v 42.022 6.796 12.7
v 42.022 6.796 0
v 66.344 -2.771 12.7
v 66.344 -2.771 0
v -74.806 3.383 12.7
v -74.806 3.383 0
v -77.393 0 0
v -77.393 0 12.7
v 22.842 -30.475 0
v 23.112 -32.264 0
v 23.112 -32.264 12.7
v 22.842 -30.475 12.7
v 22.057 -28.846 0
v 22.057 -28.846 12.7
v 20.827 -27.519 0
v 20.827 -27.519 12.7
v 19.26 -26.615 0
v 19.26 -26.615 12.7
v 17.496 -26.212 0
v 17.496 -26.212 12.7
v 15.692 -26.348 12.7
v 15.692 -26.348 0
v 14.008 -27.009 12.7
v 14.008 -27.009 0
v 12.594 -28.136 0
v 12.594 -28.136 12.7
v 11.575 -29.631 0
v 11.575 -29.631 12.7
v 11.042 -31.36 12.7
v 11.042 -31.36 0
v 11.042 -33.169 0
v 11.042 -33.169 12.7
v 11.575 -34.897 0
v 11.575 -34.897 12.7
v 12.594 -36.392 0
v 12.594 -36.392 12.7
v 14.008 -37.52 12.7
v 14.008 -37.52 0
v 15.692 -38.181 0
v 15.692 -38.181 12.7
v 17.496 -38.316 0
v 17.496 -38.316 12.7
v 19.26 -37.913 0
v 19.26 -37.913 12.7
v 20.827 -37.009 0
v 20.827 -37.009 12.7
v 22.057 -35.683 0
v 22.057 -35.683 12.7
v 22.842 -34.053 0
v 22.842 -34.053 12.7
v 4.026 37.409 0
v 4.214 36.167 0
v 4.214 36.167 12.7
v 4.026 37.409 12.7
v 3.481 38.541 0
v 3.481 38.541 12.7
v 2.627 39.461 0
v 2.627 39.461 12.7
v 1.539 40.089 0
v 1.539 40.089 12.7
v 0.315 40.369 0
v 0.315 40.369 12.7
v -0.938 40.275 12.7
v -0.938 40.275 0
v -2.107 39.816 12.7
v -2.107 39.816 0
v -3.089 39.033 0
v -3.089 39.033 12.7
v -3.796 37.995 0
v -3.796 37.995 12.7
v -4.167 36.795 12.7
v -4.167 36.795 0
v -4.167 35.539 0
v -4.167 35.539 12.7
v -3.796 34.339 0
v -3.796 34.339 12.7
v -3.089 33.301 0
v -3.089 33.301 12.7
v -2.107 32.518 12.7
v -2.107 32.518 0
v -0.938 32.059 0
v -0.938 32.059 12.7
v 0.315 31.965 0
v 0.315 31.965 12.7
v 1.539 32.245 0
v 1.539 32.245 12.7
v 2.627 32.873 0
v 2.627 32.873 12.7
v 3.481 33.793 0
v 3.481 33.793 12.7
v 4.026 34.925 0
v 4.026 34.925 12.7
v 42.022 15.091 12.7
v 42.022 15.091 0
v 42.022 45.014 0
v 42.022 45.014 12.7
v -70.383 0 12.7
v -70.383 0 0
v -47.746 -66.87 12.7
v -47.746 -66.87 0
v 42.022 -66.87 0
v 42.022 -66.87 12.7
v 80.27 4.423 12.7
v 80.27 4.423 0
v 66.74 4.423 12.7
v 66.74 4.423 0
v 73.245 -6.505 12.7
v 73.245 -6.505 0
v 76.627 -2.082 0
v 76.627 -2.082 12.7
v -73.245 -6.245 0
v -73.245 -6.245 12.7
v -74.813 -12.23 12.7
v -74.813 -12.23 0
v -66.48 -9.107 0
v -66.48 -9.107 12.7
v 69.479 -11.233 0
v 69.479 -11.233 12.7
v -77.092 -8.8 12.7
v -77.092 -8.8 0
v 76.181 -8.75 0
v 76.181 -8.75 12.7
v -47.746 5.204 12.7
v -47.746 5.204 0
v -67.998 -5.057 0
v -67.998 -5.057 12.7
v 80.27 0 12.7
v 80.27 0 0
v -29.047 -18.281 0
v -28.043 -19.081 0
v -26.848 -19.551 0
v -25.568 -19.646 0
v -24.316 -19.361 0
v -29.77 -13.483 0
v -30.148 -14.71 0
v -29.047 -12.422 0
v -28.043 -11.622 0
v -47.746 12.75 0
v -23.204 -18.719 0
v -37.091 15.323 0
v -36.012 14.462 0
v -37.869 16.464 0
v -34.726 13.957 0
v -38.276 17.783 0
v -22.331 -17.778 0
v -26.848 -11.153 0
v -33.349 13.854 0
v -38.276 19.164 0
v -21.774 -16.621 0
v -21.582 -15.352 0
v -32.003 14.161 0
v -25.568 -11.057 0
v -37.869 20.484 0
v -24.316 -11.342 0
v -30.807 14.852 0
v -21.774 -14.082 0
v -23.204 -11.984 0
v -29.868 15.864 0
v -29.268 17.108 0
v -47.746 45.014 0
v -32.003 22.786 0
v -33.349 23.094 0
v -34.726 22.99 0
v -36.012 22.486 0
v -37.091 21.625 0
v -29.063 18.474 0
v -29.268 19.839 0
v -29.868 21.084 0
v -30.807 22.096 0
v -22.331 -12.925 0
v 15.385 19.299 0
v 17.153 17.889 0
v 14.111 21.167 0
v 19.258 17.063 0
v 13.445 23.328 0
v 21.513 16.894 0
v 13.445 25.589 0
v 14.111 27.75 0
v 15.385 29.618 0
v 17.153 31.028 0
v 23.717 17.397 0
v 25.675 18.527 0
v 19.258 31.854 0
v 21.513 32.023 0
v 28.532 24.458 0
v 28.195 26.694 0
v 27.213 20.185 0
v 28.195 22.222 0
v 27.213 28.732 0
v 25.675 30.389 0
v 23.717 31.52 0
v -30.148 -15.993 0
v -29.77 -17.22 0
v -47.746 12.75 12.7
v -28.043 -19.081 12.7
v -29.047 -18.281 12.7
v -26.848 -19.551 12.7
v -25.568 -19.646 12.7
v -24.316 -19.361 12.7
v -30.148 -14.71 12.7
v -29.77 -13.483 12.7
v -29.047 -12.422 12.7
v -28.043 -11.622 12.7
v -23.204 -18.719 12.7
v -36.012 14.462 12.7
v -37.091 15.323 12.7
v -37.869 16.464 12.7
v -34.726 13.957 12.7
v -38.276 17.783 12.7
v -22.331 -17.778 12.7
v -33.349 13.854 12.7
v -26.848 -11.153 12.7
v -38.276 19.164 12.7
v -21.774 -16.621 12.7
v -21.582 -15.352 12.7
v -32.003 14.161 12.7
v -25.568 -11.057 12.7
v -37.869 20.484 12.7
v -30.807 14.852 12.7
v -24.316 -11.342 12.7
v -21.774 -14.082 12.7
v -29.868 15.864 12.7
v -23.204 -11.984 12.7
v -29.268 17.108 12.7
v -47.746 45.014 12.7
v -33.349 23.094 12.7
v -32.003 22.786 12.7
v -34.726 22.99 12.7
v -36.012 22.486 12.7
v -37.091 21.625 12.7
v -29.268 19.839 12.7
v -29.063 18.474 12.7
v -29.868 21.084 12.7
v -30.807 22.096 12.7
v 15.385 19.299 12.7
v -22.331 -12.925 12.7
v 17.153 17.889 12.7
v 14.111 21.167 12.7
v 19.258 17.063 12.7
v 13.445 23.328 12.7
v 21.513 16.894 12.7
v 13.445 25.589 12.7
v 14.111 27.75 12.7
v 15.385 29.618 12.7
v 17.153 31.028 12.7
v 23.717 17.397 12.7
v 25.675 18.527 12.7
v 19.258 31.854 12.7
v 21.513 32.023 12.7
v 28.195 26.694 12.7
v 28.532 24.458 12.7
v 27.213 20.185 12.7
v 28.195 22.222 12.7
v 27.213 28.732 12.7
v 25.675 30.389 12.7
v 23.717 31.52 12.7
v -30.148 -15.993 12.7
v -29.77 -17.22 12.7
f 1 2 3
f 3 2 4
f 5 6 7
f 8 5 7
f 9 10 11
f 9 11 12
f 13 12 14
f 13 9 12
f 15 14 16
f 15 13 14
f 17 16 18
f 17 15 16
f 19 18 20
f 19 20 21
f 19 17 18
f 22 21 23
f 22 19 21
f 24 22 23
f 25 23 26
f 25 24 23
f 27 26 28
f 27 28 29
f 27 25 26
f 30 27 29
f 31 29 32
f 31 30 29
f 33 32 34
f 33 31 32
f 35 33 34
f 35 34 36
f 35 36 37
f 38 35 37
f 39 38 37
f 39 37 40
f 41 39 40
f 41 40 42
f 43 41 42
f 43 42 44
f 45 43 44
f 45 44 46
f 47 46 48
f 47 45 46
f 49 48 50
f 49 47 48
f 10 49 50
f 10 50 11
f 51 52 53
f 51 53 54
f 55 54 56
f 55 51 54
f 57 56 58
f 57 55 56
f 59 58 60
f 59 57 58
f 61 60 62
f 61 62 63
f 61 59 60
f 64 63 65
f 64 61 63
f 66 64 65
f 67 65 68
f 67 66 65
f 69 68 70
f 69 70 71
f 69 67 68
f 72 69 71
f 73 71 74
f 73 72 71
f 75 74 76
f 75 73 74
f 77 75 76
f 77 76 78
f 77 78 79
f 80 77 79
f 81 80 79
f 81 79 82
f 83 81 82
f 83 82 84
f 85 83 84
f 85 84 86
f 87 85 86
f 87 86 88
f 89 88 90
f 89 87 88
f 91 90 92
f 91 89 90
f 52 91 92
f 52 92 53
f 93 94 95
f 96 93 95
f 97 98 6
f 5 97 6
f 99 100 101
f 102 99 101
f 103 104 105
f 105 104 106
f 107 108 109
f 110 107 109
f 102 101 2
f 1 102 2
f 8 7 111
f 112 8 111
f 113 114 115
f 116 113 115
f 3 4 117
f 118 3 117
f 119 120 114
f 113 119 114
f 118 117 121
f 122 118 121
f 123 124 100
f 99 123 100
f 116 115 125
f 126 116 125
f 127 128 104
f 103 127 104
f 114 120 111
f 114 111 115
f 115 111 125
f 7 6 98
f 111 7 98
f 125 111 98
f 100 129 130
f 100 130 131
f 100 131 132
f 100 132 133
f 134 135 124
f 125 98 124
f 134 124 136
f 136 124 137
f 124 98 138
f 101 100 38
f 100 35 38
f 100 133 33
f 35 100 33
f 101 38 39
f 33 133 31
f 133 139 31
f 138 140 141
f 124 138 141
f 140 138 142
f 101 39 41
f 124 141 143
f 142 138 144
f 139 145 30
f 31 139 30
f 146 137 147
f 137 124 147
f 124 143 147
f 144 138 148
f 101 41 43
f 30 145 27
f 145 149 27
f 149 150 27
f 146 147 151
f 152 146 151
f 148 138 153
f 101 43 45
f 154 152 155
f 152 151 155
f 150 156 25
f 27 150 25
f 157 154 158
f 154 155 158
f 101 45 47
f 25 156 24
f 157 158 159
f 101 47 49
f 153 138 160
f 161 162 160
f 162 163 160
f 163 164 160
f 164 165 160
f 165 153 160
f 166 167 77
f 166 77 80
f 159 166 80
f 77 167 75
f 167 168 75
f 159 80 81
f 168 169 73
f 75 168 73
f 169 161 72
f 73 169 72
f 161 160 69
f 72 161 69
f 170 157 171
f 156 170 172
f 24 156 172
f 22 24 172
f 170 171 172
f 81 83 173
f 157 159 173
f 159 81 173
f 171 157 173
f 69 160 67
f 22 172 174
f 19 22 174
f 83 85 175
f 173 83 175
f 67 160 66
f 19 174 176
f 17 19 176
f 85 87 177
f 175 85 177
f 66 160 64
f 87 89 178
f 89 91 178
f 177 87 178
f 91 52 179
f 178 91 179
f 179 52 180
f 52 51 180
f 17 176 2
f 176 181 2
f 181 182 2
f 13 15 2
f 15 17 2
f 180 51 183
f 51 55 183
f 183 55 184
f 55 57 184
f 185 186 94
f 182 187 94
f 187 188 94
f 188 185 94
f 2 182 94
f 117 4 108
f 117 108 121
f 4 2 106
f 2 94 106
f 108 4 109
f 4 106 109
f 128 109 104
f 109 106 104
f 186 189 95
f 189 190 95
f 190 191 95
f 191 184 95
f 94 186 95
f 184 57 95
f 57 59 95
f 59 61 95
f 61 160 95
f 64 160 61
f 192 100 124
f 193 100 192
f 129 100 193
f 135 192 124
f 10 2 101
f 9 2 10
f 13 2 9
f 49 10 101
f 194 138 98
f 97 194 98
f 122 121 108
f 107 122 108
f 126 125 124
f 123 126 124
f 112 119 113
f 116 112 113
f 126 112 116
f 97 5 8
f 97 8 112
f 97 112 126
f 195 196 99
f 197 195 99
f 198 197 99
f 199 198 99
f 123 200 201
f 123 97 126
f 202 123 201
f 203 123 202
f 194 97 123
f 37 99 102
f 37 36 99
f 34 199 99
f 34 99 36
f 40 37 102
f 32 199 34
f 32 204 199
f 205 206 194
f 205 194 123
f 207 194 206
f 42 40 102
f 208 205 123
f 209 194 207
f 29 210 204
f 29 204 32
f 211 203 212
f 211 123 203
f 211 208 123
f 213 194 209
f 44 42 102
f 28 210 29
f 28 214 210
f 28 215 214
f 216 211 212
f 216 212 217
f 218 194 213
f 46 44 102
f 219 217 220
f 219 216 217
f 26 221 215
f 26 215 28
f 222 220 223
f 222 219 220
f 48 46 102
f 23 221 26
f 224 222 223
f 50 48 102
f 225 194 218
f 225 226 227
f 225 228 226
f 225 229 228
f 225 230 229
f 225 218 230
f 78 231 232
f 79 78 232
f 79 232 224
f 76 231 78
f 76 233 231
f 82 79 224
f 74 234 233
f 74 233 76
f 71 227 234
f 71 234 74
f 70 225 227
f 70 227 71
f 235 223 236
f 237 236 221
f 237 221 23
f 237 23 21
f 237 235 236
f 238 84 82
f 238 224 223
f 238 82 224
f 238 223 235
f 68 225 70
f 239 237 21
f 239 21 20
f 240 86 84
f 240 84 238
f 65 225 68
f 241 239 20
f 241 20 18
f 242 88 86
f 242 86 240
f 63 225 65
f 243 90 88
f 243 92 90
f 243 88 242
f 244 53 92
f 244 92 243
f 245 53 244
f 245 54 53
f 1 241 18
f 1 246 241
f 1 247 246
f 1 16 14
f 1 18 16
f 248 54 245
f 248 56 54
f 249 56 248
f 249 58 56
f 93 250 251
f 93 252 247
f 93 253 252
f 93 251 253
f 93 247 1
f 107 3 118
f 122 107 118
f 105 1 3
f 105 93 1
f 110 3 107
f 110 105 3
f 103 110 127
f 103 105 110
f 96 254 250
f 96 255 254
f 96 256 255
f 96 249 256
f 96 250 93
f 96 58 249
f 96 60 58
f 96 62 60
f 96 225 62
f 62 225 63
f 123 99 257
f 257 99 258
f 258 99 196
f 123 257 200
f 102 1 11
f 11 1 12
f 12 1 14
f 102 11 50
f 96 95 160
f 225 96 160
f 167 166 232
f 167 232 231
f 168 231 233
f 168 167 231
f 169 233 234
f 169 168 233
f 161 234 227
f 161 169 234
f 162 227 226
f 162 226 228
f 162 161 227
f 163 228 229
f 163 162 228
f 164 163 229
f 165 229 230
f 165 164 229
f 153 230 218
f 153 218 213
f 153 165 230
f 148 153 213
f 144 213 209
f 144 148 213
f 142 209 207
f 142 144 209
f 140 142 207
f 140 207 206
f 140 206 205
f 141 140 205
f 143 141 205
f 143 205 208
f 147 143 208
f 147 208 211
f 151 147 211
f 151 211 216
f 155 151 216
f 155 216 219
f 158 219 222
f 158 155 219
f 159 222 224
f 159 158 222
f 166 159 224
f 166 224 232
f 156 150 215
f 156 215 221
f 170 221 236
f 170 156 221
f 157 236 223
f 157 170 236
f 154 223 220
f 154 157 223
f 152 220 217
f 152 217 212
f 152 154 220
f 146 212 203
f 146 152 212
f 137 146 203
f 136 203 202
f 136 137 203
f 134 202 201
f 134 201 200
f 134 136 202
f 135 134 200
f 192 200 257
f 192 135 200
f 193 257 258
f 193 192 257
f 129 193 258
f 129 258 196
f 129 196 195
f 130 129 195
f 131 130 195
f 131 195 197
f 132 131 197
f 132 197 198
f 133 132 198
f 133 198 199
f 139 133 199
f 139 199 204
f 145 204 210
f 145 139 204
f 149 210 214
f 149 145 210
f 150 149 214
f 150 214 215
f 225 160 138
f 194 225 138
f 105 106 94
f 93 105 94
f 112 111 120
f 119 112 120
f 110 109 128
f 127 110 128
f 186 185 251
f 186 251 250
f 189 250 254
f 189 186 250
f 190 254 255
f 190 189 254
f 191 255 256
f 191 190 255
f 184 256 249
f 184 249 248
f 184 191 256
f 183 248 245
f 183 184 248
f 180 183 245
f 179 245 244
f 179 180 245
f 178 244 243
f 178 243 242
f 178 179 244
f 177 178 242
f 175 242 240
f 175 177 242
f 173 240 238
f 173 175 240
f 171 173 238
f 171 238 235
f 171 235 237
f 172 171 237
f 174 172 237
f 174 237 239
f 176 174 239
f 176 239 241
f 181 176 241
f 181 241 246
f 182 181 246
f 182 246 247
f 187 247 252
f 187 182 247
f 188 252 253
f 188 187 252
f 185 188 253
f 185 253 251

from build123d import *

# Parameters (mm, degrees)
F0_R     = 4.306996
F0_R_2   = 6.068742
F0_R_3   = 4.632643
F0_R_4   = 4.213633
F0_R_5   = 7.585926
F1_DEPTH = 12.7


with BuildPart() as f1:
    # F0 (on Top) → F1 (new body)
    with BuildSketch(Plane.XY):
        Polygon((42.021509, 45.013756), (-47.745805, 45.013756), (-47.745805, 12.749561), (-47.745805, 5.203902), (-47.745805, -66.870145), (42.021509, -66.870145), (42.021509, 6.79579), (42.021509, 15.091317), align=None)
        with Locations((-25.889417, -15.351512)):
            Circle(F0_R, mode=Mode.SUBTRACT)
        with Locations((17.042782, -32.264195)):
            Circle(F0_R_2, mode=Mode.SUBTRACT)
        with Locations((-33.695269, 18.473854)):
            Circle(F0_R_3, mode=Mode.SUBTRACT)
        with Locations((0, 36.167122)):
            Circle(F0_R_4, mode=Mode.SUBTRACT)
        with Locations((20.945705, 24.458343)):
            Circle(F0_R_5, mode=Mode.SUBTRACT)
        Polygon((-47.745805, 5.203902), (-47.745805, 12.749561), (-70.382781, 0), (-74.806102, 3.382537), (-77.392745, 0), (-73.244929, -6.244683), (-77.091641, -8.799729), (-74.813173, -12.230043), (-66.479854, -9.10683), (-67.997565, -5.057293), align=None)
        Polygon((66.740051, 4.423317), (42.021509, 15.091317), (42.021509, 6.79579), (66.344172, -2.770602), (69.478922, -11.232767), (76.180932, -8.750055), (73.244929, -6.504878), (76.627463, -2.081561), (80.270201, 0), (80.270201, 4.423317), align=None)
    extrude(amount=F1_DEPTH)


solid = f1.part
